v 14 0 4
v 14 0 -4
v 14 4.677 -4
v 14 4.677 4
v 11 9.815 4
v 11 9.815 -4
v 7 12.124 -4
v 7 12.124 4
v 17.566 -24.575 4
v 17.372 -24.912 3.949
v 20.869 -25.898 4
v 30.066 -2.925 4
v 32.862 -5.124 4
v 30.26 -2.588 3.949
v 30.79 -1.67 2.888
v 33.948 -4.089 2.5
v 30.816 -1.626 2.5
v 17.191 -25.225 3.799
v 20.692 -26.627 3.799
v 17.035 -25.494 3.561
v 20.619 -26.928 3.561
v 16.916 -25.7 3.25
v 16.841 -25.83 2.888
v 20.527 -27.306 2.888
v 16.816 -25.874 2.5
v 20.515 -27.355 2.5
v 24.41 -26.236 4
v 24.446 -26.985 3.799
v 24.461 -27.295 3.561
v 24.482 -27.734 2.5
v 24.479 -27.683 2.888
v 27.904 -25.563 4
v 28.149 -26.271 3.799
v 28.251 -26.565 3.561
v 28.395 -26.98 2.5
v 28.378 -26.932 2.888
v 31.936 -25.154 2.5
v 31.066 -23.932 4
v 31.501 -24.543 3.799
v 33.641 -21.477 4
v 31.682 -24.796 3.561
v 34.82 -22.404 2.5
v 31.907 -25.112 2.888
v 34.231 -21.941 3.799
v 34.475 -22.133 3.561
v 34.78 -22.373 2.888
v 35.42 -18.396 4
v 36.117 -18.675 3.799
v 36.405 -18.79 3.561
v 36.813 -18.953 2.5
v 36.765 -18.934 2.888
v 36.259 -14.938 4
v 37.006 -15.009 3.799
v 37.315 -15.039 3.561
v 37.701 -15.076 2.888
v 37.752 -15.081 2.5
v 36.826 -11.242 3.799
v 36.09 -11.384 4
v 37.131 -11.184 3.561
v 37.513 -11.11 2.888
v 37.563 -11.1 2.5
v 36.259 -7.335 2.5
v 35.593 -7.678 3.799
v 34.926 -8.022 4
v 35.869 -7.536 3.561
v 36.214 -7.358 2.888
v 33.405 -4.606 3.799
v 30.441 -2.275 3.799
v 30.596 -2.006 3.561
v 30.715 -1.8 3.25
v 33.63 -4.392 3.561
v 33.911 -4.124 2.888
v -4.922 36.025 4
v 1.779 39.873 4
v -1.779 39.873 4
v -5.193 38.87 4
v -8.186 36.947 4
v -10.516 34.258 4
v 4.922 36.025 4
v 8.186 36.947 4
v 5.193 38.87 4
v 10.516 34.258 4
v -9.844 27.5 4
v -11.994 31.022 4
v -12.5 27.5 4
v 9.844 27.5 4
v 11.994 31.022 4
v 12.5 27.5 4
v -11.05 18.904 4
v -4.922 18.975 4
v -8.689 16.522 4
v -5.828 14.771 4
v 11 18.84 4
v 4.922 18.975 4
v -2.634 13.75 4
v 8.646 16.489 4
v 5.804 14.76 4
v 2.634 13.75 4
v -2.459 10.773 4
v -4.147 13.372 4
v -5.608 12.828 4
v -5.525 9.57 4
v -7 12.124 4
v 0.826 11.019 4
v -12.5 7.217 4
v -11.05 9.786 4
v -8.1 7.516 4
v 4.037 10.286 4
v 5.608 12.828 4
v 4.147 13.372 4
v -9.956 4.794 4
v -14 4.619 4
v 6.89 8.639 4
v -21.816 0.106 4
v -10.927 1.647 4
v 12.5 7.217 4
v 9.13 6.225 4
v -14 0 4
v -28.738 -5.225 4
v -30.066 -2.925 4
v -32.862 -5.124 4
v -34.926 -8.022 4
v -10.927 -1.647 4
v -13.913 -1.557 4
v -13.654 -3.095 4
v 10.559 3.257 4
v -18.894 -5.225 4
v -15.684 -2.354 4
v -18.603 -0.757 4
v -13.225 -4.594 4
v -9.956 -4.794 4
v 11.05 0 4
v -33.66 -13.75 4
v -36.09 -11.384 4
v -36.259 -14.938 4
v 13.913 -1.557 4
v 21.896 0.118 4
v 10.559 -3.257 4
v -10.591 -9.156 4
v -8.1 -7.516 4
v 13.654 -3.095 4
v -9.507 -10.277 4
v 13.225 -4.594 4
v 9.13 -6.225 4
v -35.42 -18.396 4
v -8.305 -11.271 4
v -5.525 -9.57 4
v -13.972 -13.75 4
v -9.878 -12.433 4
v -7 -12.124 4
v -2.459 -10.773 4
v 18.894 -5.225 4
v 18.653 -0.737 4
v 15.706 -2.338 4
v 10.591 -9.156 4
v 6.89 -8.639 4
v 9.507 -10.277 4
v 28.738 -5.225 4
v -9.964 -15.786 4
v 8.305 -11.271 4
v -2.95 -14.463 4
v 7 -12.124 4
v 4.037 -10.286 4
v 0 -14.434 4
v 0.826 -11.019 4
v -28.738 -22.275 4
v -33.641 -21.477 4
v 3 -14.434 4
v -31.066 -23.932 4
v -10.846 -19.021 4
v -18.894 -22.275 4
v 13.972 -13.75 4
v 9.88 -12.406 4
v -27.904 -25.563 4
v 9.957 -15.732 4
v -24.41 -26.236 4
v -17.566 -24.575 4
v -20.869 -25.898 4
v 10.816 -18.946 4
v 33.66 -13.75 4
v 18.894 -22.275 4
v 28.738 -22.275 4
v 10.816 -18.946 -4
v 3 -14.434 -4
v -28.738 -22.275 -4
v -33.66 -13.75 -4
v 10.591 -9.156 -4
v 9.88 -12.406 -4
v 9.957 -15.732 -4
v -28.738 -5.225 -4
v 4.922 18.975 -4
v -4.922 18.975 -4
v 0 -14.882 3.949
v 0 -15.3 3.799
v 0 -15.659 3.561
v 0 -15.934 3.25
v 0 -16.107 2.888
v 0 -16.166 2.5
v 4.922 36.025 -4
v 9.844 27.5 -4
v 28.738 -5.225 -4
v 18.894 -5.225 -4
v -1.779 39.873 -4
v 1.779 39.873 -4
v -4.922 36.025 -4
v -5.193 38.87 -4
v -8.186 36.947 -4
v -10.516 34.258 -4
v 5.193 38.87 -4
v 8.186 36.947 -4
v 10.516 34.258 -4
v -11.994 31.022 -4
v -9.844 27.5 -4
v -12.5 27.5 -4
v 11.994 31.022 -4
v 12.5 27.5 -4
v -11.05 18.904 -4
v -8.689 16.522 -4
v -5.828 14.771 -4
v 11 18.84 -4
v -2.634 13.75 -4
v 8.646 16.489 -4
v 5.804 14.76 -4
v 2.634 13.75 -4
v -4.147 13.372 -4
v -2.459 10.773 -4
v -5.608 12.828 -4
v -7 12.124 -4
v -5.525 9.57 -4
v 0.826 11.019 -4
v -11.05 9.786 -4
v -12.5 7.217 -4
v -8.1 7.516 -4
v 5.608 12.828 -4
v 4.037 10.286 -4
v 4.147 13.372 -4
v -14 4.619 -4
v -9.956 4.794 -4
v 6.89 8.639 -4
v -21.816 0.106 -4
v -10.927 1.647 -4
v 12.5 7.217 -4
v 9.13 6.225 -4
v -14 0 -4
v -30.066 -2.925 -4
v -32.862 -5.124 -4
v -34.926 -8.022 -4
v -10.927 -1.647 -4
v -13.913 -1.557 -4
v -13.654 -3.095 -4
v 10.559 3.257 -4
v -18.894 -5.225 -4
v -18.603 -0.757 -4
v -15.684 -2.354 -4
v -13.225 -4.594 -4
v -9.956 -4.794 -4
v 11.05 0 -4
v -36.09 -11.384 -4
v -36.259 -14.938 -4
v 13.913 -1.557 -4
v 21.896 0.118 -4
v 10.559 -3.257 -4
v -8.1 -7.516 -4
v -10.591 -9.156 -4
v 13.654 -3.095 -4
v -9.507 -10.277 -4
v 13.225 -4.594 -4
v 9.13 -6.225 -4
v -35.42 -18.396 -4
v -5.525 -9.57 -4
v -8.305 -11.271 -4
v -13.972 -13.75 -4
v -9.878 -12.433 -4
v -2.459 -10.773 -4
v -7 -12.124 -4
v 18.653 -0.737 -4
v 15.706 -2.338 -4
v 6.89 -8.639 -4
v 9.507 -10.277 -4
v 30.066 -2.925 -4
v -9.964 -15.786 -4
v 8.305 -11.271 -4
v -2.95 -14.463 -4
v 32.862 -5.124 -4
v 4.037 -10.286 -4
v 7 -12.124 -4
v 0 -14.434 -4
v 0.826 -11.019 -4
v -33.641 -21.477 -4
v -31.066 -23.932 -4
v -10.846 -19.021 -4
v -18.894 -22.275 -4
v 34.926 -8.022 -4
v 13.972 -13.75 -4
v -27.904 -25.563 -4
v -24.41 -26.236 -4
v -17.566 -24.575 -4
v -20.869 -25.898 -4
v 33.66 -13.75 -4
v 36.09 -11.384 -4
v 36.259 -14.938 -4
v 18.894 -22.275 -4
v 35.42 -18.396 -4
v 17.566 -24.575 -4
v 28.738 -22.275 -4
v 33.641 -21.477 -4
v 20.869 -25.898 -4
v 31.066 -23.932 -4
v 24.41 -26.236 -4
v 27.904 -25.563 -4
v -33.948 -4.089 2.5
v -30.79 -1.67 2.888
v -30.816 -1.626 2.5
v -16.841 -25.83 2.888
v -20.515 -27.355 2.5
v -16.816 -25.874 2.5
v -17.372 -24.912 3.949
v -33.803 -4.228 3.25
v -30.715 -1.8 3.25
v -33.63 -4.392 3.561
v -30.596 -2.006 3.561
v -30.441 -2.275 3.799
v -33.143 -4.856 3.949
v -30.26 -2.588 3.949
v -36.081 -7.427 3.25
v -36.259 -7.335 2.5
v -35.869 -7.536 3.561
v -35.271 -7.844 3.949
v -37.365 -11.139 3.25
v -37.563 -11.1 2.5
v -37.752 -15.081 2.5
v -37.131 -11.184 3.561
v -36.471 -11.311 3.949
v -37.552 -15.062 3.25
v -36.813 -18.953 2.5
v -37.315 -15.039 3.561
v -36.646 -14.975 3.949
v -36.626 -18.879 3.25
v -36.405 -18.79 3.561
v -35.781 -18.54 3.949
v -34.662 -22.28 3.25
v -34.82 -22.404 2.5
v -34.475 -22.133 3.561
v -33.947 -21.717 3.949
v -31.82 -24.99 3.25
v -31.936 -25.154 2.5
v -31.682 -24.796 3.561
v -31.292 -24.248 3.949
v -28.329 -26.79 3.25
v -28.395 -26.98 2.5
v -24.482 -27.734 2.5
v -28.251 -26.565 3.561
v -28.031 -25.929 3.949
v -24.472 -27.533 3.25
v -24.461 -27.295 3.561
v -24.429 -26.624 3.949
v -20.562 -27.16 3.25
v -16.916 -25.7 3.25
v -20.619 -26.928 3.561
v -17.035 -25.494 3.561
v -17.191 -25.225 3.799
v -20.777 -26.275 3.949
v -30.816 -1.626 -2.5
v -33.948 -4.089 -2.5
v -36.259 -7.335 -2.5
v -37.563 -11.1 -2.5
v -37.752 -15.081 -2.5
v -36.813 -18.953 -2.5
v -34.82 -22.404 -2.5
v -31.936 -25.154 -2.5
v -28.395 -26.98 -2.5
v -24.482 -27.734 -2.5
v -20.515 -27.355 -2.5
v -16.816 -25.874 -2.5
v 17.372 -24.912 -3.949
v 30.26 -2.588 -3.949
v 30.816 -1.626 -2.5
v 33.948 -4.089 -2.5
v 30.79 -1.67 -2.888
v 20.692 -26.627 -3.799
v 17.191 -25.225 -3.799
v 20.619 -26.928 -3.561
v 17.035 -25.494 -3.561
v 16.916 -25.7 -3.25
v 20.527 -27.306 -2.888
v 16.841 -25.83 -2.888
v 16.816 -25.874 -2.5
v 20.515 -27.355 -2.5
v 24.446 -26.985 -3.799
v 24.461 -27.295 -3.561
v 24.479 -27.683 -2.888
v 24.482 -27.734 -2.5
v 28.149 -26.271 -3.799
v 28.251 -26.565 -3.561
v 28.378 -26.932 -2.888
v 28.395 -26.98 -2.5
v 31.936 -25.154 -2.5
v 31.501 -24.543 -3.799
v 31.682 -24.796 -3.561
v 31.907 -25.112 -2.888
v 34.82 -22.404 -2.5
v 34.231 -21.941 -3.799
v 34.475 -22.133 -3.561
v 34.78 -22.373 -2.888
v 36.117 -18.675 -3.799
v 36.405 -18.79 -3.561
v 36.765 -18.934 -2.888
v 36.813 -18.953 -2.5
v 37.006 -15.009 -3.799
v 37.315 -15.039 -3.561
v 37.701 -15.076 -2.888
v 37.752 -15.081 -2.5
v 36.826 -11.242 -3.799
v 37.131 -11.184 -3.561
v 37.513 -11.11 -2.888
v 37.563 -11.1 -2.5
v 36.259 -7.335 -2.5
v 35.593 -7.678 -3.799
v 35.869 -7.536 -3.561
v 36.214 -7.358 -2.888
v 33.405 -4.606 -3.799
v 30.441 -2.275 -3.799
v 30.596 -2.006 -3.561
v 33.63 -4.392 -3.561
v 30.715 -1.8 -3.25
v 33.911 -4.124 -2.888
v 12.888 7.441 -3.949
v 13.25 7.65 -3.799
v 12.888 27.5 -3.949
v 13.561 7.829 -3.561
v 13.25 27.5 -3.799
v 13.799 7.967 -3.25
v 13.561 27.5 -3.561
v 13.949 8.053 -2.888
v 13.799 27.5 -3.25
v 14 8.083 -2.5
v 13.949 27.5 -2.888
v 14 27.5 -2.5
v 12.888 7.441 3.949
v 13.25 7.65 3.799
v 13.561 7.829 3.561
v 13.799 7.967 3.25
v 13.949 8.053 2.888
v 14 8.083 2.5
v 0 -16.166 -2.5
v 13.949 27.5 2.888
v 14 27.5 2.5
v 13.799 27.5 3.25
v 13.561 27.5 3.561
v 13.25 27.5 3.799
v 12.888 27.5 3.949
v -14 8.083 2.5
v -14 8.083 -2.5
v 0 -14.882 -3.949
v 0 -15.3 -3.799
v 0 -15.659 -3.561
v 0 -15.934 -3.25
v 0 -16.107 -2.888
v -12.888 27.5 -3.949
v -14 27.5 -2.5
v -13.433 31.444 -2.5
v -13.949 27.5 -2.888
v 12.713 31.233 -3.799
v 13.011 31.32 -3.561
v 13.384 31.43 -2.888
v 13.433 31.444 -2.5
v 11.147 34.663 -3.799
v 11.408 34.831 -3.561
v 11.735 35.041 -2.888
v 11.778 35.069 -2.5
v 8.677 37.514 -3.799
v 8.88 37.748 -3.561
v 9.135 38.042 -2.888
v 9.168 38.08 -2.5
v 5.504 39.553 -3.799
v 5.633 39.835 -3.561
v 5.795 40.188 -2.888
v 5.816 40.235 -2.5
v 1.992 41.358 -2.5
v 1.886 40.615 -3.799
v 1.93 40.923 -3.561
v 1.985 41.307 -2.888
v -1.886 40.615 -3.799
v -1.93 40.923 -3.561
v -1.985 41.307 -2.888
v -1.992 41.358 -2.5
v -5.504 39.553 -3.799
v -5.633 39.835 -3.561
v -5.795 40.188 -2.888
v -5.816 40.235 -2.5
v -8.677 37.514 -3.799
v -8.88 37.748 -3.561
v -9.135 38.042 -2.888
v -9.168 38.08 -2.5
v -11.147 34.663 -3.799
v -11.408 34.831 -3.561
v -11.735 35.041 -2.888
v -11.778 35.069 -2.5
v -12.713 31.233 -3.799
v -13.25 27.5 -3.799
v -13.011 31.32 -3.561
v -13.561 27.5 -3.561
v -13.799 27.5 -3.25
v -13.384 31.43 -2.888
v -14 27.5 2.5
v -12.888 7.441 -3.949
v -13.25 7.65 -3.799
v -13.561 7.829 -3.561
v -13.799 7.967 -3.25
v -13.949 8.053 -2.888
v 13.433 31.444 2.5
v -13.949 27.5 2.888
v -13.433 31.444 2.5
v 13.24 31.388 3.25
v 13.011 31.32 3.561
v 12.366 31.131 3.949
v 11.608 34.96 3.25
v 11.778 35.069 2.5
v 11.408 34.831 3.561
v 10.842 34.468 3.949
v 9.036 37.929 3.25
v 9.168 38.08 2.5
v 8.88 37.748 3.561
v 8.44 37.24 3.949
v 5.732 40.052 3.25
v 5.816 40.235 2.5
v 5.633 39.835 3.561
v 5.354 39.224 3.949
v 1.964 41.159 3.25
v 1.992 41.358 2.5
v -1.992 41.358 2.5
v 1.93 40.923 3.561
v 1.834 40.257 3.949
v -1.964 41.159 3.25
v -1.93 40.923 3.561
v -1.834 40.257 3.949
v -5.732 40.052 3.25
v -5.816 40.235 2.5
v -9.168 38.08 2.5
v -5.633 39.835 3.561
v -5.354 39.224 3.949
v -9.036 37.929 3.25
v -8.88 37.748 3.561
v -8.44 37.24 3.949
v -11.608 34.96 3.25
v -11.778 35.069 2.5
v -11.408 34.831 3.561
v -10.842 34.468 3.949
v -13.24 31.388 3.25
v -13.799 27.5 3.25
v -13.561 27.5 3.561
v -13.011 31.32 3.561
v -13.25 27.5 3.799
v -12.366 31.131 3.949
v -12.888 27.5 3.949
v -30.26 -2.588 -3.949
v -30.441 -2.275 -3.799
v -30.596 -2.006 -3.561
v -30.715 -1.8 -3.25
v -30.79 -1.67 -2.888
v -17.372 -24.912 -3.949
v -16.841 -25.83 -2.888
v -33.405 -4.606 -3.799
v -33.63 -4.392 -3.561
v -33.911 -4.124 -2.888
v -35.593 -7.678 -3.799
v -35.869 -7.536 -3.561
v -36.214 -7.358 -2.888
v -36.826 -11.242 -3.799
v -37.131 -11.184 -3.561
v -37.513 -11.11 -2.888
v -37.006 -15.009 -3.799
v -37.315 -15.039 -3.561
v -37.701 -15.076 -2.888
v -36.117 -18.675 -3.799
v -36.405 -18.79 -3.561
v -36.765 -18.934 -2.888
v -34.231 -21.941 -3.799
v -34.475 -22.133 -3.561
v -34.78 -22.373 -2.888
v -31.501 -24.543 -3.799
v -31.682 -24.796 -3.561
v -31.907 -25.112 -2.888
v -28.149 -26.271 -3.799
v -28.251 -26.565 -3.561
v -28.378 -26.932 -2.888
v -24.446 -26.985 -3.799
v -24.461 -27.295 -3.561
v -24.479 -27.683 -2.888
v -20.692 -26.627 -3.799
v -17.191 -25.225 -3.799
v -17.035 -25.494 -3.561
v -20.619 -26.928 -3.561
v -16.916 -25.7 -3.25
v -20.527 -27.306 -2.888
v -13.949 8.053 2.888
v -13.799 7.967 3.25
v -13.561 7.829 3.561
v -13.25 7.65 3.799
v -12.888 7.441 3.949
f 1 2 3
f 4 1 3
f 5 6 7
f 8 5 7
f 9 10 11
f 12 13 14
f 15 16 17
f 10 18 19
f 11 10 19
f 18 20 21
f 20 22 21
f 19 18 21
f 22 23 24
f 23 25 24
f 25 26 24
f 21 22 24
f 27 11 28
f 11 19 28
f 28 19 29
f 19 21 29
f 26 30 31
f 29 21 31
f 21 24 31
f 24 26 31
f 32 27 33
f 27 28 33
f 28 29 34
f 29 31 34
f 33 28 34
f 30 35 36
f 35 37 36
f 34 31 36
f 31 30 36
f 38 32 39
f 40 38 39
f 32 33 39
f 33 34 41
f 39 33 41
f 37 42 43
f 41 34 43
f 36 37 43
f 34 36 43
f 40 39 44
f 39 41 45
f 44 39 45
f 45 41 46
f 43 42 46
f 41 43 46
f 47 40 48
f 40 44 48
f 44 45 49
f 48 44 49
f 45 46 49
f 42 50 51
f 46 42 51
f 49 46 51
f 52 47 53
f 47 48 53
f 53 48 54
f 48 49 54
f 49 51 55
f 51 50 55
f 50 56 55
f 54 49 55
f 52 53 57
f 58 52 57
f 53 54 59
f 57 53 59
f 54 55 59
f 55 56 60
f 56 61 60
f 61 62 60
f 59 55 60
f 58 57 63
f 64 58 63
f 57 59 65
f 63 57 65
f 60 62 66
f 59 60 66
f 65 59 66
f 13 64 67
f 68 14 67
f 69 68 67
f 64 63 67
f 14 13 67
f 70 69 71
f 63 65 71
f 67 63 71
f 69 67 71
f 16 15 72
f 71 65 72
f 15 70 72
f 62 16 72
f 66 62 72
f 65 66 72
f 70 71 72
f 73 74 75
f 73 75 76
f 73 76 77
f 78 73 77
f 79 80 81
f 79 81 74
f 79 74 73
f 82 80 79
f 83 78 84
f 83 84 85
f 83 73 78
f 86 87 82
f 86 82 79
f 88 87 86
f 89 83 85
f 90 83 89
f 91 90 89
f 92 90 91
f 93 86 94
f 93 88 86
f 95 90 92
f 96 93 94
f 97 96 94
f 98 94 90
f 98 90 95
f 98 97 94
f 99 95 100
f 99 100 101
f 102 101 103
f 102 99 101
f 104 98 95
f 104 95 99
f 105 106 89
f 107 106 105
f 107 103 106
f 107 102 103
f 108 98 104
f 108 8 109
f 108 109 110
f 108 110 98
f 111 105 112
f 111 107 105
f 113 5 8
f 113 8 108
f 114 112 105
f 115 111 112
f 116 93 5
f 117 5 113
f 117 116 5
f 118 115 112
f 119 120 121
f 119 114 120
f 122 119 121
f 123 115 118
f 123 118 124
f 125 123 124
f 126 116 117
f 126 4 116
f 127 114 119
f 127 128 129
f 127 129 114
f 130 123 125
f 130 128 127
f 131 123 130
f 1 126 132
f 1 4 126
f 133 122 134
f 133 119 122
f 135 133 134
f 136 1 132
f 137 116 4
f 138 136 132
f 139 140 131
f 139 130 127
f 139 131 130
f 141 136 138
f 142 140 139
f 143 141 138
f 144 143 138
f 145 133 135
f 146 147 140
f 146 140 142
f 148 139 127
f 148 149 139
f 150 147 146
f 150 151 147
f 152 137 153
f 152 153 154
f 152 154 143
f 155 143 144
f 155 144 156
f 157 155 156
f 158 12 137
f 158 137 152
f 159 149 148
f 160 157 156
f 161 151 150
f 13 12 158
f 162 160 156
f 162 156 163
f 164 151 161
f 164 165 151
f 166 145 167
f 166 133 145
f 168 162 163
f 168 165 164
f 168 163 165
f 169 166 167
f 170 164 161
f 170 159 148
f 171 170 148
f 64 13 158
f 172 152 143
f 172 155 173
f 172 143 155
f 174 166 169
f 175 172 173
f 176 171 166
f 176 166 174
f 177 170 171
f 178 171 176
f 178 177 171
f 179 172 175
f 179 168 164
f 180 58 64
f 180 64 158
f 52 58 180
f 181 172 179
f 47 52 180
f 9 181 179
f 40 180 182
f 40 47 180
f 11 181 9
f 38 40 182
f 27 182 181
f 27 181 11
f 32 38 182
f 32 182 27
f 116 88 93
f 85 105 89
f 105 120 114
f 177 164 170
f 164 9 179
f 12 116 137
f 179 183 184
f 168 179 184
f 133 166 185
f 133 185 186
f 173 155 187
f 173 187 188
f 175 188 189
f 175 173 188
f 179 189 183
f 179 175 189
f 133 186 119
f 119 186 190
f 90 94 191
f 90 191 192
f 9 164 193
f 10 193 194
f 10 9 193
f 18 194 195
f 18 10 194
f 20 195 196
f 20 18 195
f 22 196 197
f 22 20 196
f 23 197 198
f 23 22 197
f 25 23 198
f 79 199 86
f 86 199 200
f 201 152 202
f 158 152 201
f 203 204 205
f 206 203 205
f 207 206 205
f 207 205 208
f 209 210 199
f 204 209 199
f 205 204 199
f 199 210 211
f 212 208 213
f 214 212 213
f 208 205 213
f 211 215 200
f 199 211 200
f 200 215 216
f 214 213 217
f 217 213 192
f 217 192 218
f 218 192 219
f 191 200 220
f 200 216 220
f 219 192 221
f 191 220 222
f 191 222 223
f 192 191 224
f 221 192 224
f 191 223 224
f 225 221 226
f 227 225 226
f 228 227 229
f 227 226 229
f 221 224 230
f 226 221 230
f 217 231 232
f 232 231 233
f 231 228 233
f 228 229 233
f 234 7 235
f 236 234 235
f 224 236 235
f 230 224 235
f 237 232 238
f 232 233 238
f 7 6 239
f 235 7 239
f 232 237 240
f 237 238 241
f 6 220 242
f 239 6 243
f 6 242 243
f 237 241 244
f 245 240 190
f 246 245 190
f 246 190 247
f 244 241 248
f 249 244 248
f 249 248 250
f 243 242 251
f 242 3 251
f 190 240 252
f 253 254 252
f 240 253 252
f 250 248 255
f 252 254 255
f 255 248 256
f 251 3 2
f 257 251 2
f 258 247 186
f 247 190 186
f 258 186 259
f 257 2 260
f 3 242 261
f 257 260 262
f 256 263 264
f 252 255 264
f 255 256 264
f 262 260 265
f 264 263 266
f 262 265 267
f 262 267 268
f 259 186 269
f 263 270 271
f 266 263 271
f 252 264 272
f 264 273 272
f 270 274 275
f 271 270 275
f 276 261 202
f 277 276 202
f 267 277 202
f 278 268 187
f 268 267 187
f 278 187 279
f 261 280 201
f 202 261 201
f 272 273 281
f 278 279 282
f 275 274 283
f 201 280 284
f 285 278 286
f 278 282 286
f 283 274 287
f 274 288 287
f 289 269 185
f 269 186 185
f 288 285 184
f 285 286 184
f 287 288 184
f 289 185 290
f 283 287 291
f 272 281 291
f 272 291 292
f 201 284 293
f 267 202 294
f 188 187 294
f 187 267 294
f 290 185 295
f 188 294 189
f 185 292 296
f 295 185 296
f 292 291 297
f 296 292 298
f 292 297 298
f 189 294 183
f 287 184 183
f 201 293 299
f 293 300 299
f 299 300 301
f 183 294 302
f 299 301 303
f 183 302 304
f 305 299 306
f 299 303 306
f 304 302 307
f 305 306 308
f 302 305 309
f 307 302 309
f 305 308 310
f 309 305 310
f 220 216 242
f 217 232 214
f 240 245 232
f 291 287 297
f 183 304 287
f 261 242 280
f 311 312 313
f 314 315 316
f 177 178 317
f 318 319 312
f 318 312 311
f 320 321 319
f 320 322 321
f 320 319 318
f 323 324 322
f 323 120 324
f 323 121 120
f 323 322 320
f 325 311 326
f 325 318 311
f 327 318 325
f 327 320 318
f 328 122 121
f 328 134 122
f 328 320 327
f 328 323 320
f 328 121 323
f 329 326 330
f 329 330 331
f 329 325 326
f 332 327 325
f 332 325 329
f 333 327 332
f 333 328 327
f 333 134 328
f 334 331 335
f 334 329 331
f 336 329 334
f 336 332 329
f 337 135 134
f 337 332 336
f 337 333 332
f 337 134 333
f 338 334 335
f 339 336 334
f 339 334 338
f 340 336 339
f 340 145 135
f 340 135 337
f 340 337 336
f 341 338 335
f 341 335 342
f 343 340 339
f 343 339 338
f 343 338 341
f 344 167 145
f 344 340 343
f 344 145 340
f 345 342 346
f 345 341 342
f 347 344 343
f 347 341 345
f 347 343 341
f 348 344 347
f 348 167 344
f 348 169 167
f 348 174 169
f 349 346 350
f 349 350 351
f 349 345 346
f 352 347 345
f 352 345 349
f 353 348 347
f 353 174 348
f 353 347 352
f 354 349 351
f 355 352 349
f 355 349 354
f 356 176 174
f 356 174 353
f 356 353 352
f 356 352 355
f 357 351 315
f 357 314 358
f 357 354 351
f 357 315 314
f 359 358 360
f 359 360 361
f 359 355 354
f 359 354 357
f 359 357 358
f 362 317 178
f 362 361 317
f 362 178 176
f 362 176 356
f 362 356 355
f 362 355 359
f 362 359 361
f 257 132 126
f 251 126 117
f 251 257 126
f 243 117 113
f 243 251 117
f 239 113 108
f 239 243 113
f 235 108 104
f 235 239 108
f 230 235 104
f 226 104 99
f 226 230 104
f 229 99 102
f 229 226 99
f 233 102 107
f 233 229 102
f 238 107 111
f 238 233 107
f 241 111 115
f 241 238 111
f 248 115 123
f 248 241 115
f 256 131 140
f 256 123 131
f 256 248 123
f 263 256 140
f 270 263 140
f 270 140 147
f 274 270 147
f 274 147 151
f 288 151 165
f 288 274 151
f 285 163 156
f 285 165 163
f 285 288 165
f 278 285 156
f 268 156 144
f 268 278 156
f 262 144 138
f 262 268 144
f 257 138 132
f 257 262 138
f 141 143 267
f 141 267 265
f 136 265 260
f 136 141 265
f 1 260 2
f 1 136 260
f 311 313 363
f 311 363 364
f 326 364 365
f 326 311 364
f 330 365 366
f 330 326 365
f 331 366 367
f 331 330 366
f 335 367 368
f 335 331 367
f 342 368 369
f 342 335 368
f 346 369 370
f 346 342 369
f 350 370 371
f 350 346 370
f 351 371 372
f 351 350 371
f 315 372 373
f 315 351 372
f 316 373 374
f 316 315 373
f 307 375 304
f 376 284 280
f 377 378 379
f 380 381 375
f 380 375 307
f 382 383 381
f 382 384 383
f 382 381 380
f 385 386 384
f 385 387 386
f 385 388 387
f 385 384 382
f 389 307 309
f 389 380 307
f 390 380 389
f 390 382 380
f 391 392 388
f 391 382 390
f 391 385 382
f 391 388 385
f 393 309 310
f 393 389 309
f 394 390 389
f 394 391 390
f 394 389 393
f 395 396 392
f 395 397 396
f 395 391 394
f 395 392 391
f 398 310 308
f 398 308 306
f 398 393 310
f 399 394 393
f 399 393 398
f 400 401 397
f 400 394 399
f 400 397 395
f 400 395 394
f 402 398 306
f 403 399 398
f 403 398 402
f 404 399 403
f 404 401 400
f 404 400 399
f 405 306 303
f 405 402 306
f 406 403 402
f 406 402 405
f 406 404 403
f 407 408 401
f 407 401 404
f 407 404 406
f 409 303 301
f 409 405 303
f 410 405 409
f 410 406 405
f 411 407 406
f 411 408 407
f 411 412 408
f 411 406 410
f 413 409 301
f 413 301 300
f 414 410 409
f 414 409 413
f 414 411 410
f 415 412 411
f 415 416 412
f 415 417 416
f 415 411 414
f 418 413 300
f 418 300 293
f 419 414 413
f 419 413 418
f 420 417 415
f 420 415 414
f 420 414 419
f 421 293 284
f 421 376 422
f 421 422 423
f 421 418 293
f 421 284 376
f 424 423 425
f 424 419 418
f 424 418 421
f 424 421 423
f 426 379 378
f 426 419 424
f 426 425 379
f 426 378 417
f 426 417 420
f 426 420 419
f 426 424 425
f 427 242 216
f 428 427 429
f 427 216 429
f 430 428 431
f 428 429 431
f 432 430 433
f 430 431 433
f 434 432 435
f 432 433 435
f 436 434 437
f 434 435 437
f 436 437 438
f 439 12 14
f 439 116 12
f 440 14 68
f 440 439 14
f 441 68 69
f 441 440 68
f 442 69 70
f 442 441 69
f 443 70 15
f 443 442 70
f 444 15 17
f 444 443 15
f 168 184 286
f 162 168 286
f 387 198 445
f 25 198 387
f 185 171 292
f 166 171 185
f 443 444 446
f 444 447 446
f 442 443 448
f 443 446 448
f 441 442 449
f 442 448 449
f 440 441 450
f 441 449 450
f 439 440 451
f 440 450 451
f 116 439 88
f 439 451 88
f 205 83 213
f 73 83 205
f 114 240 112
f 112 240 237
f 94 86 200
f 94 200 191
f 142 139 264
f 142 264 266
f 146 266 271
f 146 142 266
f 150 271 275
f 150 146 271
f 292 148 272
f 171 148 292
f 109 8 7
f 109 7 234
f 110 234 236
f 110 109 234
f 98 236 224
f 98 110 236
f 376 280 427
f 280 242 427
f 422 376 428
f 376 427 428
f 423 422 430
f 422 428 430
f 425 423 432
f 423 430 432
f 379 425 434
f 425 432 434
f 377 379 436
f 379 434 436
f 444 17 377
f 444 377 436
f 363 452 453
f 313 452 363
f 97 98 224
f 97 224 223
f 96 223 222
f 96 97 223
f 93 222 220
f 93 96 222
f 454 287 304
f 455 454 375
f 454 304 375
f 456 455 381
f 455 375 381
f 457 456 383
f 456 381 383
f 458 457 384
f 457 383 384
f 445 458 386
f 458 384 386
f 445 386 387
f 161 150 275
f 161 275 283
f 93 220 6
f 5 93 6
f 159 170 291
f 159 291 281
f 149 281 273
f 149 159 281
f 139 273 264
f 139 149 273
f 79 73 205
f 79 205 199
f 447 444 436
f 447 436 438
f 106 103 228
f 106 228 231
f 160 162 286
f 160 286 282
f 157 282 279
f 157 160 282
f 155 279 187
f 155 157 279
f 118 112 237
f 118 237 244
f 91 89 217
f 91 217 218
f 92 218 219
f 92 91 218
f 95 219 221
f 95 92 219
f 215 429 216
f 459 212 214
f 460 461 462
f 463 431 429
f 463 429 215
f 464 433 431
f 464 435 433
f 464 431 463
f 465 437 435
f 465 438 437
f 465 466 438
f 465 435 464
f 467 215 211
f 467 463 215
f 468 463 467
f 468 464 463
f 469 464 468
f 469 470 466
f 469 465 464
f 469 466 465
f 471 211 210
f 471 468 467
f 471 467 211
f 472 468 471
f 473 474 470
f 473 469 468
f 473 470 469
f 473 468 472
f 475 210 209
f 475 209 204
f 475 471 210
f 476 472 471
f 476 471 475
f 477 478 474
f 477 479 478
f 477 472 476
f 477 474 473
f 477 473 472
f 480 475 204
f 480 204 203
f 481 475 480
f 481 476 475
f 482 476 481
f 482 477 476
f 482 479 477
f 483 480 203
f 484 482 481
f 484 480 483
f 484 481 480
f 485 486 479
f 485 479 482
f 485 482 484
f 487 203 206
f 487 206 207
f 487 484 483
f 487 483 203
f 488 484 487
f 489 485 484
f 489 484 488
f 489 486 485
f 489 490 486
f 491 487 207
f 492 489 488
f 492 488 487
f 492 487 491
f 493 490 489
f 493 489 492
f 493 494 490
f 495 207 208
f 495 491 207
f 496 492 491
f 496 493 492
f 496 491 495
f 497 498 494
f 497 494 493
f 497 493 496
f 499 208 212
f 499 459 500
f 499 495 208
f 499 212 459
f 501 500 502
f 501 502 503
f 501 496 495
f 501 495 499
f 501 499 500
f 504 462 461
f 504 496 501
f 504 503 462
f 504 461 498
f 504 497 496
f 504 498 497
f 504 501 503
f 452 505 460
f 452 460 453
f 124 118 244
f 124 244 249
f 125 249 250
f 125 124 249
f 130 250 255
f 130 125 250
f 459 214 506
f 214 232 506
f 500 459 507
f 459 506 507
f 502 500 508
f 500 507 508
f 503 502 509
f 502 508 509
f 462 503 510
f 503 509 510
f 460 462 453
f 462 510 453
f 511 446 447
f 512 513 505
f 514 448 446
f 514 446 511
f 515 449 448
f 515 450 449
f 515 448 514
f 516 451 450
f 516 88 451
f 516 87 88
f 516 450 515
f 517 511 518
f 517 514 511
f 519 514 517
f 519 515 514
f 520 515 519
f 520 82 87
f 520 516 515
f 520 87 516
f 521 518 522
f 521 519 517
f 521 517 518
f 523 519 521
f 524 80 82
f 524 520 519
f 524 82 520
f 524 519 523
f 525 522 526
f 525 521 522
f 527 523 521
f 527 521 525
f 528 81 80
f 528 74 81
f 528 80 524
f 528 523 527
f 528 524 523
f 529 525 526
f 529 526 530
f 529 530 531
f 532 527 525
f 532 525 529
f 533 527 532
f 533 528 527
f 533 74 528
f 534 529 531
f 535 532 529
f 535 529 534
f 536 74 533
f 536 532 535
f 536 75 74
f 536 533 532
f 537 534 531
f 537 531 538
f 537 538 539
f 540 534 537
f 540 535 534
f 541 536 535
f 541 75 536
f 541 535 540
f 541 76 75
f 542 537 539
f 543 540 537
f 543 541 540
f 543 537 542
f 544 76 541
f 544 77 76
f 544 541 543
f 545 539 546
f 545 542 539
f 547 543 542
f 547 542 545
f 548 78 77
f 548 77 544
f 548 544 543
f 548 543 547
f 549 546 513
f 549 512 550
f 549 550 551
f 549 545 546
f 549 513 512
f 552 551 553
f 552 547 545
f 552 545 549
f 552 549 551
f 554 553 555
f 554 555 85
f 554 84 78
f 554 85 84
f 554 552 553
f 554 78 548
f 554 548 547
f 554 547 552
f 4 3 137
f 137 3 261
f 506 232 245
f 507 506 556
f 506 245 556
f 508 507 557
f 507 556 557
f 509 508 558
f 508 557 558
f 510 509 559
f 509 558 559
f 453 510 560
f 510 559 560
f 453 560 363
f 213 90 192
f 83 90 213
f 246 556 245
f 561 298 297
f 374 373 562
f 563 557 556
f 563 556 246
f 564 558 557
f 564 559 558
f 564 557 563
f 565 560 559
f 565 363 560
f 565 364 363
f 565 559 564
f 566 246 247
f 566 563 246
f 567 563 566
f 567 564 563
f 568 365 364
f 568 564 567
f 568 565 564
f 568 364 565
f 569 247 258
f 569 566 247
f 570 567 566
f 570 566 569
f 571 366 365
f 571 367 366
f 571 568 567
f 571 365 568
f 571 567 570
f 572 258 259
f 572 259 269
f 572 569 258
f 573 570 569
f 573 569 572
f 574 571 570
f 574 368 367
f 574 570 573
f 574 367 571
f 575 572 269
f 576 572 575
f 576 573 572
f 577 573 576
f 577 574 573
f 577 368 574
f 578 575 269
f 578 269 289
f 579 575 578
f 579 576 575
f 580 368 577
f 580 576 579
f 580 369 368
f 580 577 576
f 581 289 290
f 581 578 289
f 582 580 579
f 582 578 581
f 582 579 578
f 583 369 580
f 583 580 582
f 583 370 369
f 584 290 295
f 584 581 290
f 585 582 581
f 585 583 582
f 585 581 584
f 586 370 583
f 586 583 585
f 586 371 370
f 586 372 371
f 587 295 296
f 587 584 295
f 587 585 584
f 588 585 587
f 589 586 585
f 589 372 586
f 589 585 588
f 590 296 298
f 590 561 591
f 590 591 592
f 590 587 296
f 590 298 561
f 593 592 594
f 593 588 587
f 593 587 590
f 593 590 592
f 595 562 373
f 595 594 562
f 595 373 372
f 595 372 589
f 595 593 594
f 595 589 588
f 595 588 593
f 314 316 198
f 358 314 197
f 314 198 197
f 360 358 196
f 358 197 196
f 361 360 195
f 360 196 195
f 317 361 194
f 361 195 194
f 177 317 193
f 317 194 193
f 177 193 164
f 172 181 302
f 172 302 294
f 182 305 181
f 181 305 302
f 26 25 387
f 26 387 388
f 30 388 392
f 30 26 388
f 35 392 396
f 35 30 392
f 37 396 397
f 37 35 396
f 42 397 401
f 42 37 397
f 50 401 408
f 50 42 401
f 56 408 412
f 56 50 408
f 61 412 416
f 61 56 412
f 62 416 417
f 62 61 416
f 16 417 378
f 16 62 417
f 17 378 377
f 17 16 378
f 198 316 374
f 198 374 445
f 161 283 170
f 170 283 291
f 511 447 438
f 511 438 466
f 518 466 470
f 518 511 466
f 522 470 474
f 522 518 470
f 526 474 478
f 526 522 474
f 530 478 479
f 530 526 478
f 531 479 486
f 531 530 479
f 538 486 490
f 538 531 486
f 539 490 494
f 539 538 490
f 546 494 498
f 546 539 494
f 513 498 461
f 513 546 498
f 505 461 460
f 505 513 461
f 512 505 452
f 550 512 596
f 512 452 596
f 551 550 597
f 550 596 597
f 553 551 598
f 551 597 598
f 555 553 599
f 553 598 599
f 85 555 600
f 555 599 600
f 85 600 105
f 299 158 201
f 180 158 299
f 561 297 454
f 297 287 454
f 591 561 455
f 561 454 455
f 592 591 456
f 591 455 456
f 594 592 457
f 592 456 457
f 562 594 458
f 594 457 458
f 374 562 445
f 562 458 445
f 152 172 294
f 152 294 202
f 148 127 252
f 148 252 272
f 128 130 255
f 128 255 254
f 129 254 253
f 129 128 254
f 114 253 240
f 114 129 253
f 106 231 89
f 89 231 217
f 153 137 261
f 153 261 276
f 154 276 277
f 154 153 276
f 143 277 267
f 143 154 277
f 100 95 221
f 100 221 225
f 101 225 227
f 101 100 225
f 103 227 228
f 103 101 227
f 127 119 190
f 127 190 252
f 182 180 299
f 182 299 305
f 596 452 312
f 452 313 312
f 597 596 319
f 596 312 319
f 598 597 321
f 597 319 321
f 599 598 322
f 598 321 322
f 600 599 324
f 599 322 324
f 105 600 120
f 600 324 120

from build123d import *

# Parameters (mm, degrees)
F0_R     = 11.05
F1_DEPTH = 4
F2_COUNT = 3
F3_R     = 1.5


with BuildPart() as f1:
    # F0 (on Top) → F1 (new body, symmetric)
    with BuildSketch(Plane.XY):
        with BuildLine():
            Line((-14, 27.5), (-14, 0))
            ThreePointArc((-14, 0), (0, -14), (14, 0))
            Line((14, 0), (14, 27.5))
            ThreePointArc((14, 27.5), (0, 41.5), (-14, 27.5))
        make_face()
        Circle(F0_R, mode=Mode.SUBTRACT)
        with BuildLine():
            Line((-11.05, 8.5963655111), (-11.05, 18.9036344889))
            ThreePointArc((-11.05, 18.9036344889), (-7.3111120124, 15.5606683126), (-2.6339134382, 13.75))
            ThreePointArc((-2.6339134382, 13.75), (-7.3111120124, 11.9393316874), (-11.05, 8.5963655111))
        make_face(mode=Mode.SUBTRACT)
        Polygon((-9.8438220897, 27.5), (-4.9219110448, 36.025), (4.9219110448, 36.025), (9.8438220897, 27.5), (4.9219110448, 18.975), (-4.9219110448, 18.975), align=None, mode=Mode.SUBTRACT)
        with BuildLine():
            Line((11, 18.8397459622), (11, 8.6602540378))
            ThreePointArc((11, 8.6602540378), (7.2764879853, 11.9604649826), (2.6339134382, 13.75))
            ThreePointArc((2.6339134382, 13.75), (7.2764879853, 15.5395350174), (11, 18.8397459622))
        make_face(mode=Mode.SUBTRACT)
    extrude(amount=F1_DEPTH, both=True)

    # F2: F1 ×3 about axis
    f2_axis = Axis((0, 0, 4), (0, 0, 1))


with BuildPart() as f1_1:
    add(f1.part)
    for i in range(1, F2_COUNT):
        add(f1.part.rotate(f2_axis, i * 360 / F2_COUNT))

    # F3
    f3_edges = [f1_1.edges().sort_by_distance(p)[0] for p in [
        (14, 27.5, 0),
        (0, 41.5, -4),
        (-14, 27.5, 0),
        (0, 41.5, 4),
        (16.815699, -25.874356, 0),
        (35.940054, -20.75, -4),
        (30.815699, -1.625644, 0),
        (35.940054, -20.75, 4),
        (-30.815699, -1.625644, 0),
        (-35.940054, -20.75, -4),
        (-16.815699, -25.874356, 0),
        (-35.940054, -20.75, 4),
    ]]
    fillet(f3_edges, radius=F3_R)


solid = f1_1.part
